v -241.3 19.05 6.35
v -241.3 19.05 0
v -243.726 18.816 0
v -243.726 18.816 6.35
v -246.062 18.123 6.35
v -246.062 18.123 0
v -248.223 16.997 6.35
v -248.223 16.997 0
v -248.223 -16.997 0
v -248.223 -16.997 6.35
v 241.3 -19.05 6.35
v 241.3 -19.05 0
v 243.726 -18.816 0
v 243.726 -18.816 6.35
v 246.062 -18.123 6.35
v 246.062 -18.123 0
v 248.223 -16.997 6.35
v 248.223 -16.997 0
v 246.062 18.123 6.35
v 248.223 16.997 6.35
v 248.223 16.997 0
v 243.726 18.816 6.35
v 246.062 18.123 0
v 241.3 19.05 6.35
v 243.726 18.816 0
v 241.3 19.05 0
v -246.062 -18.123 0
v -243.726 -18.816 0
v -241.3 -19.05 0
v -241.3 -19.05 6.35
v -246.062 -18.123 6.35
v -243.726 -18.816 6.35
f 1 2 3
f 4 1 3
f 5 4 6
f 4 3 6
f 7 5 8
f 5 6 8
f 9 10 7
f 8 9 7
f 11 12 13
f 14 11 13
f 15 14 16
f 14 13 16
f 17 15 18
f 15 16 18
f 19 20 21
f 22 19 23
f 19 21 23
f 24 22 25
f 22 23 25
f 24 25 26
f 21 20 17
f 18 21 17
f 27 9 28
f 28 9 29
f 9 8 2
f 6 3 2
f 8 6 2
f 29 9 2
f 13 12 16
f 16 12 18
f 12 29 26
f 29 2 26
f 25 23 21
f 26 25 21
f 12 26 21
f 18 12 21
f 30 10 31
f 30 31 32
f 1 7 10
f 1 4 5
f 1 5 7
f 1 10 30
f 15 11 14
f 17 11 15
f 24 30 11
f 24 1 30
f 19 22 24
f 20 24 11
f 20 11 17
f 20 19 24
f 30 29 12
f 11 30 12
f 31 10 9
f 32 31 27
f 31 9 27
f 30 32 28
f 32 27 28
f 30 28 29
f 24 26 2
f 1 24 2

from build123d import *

# Parameters (mm, degrees)
F1_DEPTH = 6.35
F3_DEPTH = 25.4
F5_DEPTH = 25.4


with BuildPart() as f1:
    # F0 (on Top) → F1 (new body)
    with BuildSketch(Plane.XY):
        with BuildLine():
            ThreePointArc((-254, -6.35), (-250.280256, -15.330256), (-241.3, -19.05))
            Line((-241.3, -19.05), (241.3, -19.05))
            ThreePointArc((241.3, -19.05), (250.280256, -15.330256), (254, -6.35))
            Line((254, -6.35), (254, 6.35))
            ThreePointArc((254, 6.35), (250.280256, 15.330256), (241.3, 19.05))
            Line((241.3, 19.05), (-241.3, 19.05))
            ThreePointArc((-241.3, 19.05), (-250.280256, 15.330256), (-254, 6.35))
            Line((-254, 6.35), (-254, -6.35))
        make_face()
    extrude(amount=F1_DEPTH)

    # F2 (on face) → F3 (cut)
    with BuildSketch(Plane.XY.offset(6.35)):
        with BuildLine():
            Line((250.280256, 15.330256), (250.280256, -15.330256))
            ThreePointArc((250.280256, -15.330256), (253.03327, -11.21008), (254, -6.35))
            Line((254, -6.35), (254, 6.35))
            ThreePointArc((254, 6.35), (253.03327, 11.21008), (250.280256, 15.330256))
        make_face()
        with BuildLine():
            Line((-254, 6.35), (-254, -6.35))
            ThreePointArc((-254, -6.35), (-253.03327, -11.21008), (-250.280256, -15.330256))
            Line((-250.280256, -15.330256), (-250.280256, 15.330256))
            ThreePointArc((-250.280256, 15.330256), (-253.03327, 11.21008), (-254, 6.35))
        make_face()
    extrude(amount=-F3_DEPTH, mode=Mode.SUBTRACT)

    # F4 (on face) → F5 (cut)
    with BuildSketch(Plane.XY.offset(6.35)):
        with BuildLine():
            Line((-248.22277, -16.997312), (-248.22277, 16.997312))
            ThreePointArc((-248.22277, 16.997312), (-249.295082, 16.217556), (-250.280256, 15.330256))
            Line((-250.280256, 15.330256), (-250.280256, -15.330256))
            ThreePointArc((-250.280256, -15.330256), (-249.295082, -16.217556), (-248.22277, -16.997312))
        make_face()
        with BuildLine():
            ThreePointArc((250.280256, 15.330256), (249.295082, 16.217556), (248.22277, 16.997312))
            Line((248.22277, 16.997312), (248.22277, -16.997312))
            ThreePointArc((248.22277, -16.997312), (249.295082, -16.217556), (250.280256, -15.330256))
            Line((250.280256, -15.330256), (250.280256, 15.330256))
        make_face()
    extrude(amount=-F5_DEPTH, mode=Mode.SUBTRACT)


solid = f1.part
